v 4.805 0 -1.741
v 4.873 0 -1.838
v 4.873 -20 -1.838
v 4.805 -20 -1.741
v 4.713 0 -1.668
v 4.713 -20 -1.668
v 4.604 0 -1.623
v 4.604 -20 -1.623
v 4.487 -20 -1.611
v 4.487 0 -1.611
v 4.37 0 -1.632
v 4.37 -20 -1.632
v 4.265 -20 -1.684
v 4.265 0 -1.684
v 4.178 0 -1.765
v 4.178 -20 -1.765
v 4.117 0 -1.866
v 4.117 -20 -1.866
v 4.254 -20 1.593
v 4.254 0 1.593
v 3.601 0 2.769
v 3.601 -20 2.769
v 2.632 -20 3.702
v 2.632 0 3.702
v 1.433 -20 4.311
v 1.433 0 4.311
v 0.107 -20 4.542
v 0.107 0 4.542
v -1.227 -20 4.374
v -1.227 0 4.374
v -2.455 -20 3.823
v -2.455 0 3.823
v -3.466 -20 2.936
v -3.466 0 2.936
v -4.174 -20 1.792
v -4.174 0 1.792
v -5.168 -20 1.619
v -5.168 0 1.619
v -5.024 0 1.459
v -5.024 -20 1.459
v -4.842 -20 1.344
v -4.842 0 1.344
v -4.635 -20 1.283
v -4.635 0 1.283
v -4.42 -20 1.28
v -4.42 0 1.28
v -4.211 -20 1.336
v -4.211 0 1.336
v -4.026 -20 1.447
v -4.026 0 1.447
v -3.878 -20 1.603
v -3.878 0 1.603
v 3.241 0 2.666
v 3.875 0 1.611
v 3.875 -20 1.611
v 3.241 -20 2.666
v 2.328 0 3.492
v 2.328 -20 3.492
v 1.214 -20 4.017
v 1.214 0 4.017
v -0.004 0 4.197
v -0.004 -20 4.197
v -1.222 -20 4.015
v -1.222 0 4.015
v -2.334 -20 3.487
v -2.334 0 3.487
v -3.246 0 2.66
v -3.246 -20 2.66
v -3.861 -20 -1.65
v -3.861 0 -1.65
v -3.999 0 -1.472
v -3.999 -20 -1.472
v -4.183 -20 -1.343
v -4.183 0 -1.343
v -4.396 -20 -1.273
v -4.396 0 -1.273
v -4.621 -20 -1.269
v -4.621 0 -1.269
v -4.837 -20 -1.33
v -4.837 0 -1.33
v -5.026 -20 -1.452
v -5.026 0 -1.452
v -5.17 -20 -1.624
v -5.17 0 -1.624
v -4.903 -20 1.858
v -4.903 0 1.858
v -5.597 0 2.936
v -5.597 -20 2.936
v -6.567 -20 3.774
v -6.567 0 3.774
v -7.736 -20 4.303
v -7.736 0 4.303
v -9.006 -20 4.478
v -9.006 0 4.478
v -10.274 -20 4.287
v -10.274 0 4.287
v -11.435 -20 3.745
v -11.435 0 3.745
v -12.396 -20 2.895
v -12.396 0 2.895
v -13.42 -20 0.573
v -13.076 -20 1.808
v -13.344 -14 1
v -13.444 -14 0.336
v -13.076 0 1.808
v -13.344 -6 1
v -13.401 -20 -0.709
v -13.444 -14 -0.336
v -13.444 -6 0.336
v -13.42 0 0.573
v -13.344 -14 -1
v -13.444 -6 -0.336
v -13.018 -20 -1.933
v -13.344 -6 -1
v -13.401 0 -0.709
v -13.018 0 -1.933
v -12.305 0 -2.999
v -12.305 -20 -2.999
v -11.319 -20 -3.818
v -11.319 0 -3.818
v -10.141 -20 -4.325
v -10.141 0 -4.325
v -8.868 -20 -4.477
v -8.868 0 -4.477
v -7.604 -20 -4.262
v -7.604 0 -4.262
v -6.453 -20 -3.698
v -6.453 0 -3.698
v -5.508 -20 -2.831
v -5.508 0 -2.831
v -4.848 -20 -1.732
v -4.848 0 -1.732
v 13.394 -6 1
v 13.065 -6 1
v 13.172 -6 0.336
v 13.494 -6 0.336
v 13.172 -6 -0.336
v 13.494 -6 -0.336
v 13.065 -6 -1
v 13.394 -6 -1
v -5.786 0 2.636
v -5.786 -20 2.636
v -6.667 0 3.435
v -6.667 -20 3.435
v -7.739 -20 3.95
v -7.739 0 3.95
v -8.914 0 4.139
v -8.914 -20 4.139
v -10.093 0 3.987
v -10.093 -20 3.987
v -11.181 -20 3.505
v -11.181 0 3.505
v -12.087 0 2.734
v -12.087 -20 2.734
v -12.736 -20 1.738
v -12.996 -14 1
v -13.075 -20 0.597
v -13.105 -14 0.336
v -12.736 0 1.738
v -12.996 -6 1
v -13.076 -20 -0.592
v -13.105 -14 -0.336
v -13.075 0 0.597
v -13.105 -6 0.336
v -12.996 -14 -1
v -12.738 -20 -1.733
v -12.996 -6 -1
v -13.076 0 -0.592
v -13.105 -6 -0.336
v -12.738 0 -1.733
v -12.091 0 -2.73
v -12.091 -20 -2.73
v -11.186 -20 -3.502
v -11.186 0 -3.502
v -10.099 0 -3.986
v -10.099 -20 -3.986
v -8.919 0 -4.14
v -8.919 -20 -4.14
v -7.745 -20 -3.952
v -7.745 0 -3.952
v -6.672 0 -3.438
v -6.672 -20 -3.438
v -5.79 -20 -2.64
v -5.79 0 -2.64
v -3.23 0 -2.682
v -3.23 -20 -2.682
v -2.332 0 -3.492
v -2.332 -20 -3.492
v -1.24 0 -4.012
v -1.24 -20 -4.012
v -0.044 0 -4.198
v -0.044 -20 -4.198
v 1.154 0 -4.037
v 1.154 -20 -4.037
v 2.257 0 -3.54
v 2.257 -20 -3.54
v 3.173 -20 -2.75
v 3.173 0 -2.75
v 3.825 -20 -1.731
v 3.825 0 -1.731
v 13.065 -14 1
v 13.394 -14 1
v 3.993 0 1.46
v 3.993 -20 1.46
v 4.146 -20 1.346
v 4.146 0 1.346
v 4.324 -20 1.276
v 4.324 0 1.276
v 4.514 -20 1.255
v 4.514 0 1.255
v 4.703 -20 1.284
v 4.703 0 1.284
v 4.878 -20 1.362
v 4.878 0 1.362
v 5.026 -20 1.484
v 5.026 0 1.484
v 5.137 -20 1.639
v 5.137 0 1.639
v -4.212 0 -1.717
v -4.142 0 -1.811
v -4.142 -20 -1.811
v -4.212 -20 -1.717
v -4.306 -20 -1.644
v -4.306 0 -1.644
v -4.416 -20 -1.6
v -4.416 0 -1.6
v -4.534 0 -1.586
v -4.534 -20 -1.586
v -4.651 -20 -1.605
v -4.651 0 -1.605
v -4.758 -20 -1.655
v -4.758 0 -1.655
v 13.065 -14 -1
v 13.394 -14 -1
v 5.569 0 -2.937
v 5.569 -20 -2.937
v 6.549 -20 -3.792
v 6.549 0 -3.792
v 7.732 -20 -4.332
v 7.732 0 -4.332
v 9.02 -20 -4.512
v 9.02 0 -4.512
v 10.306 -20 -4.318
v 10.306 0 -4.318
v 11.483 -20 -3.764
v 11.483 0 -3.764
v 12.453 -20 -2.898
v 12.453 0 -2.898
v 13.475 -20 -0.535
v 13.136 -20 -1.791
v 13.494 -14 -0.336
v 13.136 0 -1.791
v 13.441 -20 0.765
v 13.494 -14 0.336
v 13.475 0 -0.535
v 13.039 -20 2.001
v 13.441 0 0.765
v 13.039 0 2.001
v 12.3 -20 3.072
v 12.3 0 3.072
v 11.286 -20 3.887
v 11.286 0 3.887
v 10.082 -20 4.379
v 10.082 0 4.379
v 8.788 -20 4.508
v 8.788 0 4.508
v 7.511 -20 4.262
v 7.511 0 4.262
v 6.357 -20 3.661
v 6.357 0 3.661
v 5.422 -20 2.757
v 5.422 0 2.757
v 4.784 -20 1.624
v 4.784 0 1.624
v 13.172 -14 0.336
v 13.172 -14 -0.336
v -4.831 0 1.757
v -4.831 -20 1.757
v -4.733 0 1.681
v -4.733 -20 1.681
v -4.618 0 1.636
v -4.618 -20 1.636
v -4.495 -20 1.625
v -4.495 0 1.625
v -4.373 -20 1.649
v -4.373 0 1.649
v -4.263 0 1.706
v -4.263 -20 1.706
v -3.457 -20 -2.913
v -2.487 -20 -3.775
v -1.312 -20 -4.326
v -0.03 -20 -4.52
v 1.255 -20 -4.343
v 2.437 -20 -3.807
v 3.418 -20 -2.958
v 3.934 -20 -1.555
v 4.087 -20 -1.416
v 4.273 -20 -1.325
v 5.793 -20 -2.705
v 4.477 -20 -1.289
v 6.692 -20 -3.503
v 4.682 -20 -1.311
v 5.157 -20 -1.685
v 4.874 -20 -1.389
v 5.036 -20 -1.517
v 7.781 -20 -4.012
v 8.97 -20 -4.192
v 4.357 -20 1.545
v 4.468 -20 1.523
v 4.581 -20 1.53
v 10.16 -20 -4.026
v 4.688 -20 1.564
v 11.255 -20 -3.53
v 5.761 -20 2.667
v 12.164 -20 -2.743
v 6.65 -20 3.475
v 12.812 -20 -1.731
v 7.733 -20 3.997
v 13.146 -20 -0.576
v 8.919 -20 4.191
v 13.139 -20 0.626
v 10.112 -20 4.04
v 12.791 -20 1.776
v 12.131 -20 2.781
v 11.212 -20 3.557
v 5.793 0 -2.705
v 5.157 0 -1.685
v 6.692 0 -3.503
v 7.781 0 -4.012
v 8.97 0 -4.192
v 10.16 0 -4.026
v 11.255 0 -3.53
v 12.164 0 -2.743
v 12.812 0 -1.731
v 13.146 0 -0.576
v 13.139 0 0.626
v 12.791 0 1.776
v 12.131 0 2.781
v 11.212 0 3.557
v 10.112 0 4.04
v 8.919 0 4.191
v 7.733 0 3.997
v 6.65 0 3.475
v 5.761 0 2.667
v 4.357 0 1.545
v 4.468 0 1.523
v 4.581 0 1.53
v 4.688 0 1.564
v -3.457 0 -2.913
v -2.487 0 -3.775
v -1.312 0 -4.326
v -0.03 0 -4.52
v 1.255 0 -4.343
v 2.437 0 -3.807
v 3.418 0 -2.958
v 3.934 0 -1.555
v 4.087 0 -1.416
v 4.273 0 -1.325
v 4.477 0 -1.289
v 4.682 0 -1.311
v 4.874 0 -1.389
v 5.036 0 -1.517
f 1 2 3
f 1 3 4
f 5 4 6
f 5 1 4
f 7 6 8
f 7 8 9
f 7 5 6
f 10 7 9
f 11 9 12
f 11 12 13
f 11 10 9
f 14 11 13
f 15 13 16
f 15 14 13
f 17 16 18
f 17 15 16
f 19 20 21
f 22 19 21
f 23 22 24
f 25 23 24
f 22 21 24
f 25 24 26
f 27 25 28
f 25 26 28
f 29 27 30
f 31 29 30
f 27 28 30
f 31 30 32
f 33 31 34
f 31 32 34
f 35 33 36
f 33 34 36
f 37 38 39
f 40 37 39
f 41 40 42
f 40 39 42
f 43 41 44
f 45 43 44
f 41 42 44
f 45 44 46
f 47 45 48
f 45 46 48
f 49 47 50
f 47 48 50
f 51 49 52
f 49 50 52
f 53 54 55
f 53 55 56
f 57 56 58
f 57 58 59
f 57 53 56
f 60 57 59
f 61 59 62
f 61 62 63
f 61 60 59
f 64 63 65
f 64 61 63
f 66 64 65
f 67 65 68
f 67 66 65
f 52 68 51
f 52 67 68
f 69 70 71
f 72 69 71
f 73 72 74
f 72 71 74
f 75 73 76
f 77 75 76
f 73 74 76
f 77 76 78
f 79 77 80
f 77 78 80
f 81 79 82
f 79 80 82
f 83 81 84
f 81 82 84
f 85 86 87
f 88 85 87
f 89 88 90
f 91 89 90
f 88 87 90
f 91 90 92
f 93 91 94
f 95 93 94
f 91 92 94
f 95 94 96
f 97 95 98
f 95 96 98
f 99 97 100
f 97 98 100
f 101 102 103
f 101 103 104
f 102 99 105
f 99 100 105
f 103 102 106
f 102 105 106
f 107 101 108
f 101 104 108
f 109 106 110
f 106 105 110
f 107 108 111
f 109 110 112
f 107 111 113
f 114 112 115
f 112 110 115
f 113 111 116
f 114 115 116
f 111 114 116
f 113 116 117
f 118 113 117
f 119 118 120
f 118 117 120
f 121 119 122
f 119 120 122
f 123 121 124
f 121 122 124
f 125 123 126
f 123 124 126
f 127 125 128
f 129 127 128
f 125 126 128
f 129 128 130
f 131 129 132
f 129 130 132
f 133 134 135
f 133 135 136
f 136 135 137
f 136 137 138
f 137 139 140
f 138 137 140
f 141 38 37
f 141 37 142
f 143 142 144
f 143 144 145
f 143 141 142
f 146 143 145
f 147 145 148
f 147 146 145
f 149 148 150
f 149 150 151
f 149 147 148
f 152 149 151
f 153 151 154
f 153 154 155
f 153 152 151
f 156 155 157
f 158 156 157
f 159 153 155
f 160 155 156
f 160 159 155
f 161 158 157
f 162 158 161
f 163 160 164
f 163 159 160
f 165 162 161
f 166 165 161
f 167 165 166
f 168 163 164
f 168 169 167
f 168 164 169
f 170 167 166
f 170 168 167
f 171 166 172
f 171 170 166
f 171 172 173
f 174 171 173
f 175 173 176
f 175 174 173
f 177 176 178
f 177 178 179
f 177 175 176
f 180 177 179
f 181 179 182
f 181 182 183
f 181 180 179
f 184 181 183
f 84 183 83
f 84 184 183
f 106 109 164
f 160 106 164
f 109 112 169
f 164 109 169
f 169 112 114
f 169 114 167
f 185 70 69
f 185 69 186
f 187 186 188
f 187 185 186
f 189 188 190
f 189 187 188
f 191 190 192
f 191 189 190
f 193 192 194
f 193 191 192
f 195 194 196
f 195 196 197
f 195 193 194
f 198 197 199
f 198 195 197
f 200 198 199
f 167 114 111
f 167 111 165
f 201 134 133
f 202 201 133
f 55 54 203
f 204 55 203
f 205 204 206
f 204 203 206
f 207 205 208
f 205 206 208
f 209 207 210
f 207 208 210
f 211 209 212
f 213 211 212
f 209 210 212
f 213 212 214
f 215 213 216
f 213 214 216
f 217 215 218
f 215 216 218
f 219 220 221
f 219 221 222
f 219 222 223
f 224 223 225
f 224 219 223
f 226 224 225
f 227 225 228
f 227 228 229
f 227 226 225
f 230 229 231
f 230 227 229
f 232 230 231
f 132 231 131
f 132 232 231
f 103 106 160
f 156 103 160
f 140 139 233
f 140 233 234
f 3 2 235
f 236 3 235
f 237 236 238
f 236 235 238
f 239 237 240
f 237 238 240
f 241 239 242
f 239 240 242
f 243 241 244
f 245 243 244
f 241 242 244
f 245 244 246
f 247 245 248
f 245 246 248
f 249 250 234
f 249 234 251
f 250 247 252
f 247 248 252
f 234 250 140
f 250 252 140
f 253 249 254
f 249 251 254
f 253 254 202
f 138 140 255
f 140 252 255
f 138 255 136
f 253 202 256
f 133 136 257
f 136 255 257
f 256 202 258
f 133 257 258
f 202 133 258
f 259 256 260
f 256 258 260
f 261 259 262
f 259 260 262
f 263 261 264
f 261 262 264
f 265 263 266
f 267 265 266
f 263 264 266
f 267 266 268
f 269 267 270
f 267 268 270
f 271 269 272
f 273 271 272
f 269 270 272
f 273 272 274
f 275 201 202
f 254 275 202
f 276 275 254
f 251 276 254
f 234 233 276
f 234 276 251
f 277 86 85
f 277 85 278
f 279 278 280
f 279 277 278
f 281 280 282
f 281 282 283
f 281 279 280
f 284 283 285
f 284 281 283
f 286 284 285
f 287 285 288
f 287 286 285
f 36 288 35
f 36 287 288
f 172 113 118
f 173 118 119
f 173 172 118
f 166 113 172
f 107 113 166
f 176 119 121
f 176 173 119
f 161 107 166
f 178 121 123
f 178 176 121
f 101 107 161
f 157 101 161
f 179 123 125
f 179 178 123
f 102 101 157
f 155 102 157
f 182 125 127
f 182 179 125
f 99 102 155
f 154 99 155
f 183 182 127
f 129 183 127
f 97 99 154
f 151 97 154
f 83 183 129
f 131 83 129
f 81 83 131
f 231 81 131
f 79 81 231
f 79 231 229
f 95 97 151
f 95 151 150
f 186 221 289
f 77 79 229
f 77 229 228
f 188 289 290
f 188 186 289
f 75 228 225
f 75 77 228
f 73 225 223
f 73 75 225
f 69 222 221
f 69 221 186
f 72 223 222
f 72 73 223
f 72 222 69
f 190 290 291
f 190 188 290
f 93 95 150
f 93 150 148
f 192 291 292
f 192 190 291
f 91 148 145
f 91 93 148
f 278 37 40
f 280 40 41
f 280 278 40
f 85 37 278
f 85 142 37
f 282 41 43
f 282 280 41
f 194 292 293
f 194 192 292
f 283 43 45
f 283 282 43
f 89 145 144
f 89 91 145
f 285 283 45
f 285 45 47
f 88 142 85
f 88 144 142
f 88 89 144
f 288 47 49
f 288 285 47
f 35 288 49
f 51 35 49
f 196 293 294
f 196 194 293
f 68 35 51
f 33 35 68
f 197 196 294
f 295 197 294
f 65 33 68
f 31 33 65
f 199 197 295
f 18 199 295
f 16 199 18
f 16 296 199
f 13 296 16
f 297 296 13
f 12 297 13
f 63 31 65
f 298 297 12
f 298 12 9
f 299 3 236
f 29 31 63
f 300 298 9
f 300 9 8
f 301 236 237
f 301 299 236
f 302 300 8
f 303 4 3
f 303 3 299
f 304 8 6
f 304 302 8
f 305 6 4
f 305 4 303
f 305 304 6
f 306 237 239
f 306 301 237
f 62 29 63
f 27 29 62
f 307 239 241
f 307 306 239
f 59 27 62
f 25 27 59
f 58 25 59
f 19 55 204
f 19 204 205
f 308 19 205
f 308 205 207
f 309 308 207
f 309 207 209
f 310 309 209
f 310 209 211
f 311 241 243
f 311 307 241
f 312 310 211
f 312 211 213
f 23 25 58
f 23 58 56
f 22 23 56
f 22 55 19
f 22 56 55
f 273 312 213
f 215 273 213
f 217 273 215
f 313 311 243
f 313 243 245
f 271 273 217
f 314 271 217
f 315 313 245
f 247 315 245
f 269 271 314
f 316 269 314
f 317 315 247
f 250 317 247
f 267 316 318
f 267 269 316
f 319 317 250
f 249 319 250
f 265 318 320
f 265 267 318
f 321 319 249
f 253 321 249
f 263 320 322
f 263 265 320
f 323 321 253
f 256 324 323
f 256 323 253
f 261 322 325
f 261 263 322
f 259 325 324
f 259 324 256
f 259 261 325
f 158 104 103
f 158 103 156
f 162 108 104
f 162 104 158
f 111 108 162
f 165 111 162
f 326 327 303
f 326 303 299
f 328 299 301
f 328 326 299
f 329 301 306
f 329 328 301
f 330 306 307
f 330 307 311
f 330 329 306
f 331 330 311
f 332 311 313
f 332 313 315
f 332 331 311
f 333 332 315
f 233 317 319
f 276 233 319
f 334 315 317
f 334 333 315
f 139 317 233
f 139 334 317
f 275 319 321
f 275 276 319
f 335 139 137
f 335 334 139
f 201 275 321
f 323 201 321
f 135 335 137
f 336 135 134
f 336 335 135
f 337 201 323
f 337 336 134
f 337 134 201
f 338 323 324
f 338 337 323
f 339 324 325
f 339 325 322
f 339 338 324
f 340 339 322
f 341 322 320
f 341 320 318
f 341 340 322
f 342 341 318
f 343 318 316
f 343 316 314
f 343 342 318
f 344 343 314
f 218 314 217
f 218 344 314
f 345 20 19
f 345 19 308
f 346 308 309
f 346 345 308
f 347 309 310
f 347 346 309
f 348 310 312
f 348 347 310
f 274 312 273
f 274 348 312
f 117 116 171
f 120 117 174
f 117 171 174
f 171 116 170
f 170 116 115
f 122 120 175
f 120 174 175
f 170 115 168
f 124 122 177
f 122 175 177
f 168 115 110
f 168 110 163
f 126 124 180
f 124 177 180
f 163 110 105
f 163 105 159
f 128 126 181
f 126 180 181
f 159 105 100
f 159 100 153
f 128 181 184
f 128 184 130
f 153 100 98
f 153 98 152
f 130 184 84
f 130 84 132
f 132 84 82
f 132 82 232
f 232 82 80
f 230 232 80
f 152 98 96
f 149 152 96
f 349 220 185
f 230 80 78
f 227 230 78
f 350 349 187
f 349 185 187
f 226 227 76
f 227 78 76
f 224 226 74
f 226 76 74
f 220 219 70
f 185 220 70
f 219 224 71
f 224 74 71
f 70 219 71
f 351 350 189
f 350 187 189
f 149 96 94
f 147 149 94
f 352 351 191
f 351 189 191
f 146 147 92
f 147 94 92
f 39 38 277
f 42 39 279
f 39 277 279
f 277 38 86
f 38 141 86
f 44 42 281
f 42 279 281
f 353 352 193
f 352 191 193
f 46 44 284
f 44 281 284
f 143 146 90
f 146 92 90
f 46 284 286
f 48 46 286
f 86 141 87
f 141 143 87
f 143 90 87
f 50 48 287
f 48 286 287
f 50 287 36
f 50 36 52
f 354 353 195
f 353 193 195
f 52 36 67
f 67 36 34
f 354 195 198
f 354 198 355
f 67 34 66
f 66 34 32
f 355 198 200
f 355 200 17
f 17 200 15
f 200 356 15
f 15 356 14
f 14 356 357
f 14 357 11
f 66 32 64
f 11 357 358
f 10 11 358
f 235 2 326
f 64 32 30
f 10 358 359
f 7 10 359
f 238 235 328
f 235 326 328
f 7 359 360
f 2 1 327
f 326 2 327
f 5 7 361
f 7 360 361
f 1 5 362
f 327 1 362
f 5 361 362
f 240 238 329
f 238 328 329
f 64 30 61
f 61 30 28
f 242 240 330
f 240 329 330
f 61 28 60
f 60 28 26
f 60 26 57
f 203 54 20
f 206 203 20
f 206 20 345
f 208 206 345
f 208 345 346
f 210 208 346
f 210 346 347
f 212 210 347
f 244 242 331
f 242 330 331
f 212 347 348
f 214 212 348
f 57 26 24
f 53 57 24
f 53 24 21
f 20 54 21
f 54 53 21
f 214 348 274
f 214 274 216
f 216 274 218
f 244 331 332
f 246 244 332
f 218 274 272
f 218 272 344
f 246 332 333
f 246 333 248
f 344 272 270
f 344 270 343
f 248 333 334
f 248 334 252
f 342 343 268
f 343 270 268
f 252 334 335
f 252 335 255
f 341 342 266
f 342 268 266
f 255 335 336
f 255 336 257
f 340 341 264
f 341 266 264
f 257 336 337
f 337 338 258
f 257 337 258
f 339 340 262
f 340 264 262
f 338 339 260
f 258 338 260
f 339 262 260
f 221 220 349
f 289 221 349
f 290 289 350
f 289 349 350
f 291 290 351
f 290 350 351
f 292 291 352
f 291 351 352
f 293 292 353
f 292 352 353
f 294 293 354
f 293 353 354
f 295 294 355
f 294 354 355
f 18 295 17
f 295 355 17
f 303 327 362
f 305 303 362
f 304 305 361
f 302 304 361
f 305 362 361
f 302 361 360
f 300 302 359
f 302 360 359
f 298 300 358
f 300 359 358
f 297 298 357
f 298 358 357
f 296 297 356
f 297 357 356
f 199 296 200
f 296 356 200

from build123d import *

# Parameters (mm, degrees)
BOX_W     = 30
BOX_H     = 8
BOX_DEPTH = 2
PAD_DEPTH = 20


with BuildPart() as cube:
    # Box → Box (new body)
    with BuildSketch(Plane(origin=(-15, -14, -1), x_dir=(1, 0, 0), z_dir=(0, 0, 1))):
        with Locations((15, 4)):
            Rectangle(BOX_W, BOX_H)
    extrude(amount=BOX_DEPTH)


with BuildPart() as cut:
    # Sketch001 → Pad (new body)
    with BuildSketch(Plane.XZ):
        with BuildLine():
            ThreePointArc((4.254276, 1.593075), (0.107321, 4.541501), (-4.174276, 1.792251))
            ThreePointArc((-4.903411, 1.857822), (-4.556737, 1.626068), (-4.174276, 1.792251))
            ThreePointArc((-4.903411, 1.857822), (-13.456487, -0.068818), (-4.848247, -1.731724))
            ThreePointArc((-4.141644, -1.811432), (-4.474352, -1.589018), (-4.848247, -1.731724))
            ThreePointArc((-4.141644, -1.811432), (-0.029723, -4.520356), (4.117465, -1.865739))
            ThreePointArc((4.873323, -1.837964), (4.486531, -1.610669), (4.117465, -1.865739))
            ThreePointArc((4.873323, -1.837964), (13.505182, 0.115954), (4.784336, 1.623809))
            ThreePointArc((4.254276, 1.593075), (4.524261, 1.522978), (4.784336, 1.623809))
        make_face()
        with BuildLine():
            ThreePointArc((3.875197, 1.610758), (-0.003981, 4.196626), (-3.878246, 1.603403))
            ThreePointArc((-5.168346, 1.619355), (-4.527466, 1.274089), (-3.878246, 1.603403))
            ThreePointArc((-5.168346, 1.619355), (-13.118412, 0.002733), (-5.170487, -1.624384))
            ThreePointArc((-3.861033, -1.649724), (-4.508513, -1.262573), (-5.170487, -1.624384))
            ThreePointArc((-3.861033, -1.649724), (-0.044432, -4.198474), (3.825254, -1.731068))
            ThreePointArc((5.156586, -1.685491), (4.476572, -1.289173), (3.825254, -1.731068))
            ThreePointArc((5.156586, -1.685491), (13.185859, 0.025154), (5.136633, 1.639308))
            ThreePointArc((3.875197, 1.610758), (4.5143, 1.254541), (5.136633, 1.639308))
        make_face(mode=Mode.SUBTRACT)
    extrude(amount=PAD_DEPTH)

    # Cut: cut Cube
    add(cube.part, mode=Mode.SUBTRACT)


solid = cut.part
